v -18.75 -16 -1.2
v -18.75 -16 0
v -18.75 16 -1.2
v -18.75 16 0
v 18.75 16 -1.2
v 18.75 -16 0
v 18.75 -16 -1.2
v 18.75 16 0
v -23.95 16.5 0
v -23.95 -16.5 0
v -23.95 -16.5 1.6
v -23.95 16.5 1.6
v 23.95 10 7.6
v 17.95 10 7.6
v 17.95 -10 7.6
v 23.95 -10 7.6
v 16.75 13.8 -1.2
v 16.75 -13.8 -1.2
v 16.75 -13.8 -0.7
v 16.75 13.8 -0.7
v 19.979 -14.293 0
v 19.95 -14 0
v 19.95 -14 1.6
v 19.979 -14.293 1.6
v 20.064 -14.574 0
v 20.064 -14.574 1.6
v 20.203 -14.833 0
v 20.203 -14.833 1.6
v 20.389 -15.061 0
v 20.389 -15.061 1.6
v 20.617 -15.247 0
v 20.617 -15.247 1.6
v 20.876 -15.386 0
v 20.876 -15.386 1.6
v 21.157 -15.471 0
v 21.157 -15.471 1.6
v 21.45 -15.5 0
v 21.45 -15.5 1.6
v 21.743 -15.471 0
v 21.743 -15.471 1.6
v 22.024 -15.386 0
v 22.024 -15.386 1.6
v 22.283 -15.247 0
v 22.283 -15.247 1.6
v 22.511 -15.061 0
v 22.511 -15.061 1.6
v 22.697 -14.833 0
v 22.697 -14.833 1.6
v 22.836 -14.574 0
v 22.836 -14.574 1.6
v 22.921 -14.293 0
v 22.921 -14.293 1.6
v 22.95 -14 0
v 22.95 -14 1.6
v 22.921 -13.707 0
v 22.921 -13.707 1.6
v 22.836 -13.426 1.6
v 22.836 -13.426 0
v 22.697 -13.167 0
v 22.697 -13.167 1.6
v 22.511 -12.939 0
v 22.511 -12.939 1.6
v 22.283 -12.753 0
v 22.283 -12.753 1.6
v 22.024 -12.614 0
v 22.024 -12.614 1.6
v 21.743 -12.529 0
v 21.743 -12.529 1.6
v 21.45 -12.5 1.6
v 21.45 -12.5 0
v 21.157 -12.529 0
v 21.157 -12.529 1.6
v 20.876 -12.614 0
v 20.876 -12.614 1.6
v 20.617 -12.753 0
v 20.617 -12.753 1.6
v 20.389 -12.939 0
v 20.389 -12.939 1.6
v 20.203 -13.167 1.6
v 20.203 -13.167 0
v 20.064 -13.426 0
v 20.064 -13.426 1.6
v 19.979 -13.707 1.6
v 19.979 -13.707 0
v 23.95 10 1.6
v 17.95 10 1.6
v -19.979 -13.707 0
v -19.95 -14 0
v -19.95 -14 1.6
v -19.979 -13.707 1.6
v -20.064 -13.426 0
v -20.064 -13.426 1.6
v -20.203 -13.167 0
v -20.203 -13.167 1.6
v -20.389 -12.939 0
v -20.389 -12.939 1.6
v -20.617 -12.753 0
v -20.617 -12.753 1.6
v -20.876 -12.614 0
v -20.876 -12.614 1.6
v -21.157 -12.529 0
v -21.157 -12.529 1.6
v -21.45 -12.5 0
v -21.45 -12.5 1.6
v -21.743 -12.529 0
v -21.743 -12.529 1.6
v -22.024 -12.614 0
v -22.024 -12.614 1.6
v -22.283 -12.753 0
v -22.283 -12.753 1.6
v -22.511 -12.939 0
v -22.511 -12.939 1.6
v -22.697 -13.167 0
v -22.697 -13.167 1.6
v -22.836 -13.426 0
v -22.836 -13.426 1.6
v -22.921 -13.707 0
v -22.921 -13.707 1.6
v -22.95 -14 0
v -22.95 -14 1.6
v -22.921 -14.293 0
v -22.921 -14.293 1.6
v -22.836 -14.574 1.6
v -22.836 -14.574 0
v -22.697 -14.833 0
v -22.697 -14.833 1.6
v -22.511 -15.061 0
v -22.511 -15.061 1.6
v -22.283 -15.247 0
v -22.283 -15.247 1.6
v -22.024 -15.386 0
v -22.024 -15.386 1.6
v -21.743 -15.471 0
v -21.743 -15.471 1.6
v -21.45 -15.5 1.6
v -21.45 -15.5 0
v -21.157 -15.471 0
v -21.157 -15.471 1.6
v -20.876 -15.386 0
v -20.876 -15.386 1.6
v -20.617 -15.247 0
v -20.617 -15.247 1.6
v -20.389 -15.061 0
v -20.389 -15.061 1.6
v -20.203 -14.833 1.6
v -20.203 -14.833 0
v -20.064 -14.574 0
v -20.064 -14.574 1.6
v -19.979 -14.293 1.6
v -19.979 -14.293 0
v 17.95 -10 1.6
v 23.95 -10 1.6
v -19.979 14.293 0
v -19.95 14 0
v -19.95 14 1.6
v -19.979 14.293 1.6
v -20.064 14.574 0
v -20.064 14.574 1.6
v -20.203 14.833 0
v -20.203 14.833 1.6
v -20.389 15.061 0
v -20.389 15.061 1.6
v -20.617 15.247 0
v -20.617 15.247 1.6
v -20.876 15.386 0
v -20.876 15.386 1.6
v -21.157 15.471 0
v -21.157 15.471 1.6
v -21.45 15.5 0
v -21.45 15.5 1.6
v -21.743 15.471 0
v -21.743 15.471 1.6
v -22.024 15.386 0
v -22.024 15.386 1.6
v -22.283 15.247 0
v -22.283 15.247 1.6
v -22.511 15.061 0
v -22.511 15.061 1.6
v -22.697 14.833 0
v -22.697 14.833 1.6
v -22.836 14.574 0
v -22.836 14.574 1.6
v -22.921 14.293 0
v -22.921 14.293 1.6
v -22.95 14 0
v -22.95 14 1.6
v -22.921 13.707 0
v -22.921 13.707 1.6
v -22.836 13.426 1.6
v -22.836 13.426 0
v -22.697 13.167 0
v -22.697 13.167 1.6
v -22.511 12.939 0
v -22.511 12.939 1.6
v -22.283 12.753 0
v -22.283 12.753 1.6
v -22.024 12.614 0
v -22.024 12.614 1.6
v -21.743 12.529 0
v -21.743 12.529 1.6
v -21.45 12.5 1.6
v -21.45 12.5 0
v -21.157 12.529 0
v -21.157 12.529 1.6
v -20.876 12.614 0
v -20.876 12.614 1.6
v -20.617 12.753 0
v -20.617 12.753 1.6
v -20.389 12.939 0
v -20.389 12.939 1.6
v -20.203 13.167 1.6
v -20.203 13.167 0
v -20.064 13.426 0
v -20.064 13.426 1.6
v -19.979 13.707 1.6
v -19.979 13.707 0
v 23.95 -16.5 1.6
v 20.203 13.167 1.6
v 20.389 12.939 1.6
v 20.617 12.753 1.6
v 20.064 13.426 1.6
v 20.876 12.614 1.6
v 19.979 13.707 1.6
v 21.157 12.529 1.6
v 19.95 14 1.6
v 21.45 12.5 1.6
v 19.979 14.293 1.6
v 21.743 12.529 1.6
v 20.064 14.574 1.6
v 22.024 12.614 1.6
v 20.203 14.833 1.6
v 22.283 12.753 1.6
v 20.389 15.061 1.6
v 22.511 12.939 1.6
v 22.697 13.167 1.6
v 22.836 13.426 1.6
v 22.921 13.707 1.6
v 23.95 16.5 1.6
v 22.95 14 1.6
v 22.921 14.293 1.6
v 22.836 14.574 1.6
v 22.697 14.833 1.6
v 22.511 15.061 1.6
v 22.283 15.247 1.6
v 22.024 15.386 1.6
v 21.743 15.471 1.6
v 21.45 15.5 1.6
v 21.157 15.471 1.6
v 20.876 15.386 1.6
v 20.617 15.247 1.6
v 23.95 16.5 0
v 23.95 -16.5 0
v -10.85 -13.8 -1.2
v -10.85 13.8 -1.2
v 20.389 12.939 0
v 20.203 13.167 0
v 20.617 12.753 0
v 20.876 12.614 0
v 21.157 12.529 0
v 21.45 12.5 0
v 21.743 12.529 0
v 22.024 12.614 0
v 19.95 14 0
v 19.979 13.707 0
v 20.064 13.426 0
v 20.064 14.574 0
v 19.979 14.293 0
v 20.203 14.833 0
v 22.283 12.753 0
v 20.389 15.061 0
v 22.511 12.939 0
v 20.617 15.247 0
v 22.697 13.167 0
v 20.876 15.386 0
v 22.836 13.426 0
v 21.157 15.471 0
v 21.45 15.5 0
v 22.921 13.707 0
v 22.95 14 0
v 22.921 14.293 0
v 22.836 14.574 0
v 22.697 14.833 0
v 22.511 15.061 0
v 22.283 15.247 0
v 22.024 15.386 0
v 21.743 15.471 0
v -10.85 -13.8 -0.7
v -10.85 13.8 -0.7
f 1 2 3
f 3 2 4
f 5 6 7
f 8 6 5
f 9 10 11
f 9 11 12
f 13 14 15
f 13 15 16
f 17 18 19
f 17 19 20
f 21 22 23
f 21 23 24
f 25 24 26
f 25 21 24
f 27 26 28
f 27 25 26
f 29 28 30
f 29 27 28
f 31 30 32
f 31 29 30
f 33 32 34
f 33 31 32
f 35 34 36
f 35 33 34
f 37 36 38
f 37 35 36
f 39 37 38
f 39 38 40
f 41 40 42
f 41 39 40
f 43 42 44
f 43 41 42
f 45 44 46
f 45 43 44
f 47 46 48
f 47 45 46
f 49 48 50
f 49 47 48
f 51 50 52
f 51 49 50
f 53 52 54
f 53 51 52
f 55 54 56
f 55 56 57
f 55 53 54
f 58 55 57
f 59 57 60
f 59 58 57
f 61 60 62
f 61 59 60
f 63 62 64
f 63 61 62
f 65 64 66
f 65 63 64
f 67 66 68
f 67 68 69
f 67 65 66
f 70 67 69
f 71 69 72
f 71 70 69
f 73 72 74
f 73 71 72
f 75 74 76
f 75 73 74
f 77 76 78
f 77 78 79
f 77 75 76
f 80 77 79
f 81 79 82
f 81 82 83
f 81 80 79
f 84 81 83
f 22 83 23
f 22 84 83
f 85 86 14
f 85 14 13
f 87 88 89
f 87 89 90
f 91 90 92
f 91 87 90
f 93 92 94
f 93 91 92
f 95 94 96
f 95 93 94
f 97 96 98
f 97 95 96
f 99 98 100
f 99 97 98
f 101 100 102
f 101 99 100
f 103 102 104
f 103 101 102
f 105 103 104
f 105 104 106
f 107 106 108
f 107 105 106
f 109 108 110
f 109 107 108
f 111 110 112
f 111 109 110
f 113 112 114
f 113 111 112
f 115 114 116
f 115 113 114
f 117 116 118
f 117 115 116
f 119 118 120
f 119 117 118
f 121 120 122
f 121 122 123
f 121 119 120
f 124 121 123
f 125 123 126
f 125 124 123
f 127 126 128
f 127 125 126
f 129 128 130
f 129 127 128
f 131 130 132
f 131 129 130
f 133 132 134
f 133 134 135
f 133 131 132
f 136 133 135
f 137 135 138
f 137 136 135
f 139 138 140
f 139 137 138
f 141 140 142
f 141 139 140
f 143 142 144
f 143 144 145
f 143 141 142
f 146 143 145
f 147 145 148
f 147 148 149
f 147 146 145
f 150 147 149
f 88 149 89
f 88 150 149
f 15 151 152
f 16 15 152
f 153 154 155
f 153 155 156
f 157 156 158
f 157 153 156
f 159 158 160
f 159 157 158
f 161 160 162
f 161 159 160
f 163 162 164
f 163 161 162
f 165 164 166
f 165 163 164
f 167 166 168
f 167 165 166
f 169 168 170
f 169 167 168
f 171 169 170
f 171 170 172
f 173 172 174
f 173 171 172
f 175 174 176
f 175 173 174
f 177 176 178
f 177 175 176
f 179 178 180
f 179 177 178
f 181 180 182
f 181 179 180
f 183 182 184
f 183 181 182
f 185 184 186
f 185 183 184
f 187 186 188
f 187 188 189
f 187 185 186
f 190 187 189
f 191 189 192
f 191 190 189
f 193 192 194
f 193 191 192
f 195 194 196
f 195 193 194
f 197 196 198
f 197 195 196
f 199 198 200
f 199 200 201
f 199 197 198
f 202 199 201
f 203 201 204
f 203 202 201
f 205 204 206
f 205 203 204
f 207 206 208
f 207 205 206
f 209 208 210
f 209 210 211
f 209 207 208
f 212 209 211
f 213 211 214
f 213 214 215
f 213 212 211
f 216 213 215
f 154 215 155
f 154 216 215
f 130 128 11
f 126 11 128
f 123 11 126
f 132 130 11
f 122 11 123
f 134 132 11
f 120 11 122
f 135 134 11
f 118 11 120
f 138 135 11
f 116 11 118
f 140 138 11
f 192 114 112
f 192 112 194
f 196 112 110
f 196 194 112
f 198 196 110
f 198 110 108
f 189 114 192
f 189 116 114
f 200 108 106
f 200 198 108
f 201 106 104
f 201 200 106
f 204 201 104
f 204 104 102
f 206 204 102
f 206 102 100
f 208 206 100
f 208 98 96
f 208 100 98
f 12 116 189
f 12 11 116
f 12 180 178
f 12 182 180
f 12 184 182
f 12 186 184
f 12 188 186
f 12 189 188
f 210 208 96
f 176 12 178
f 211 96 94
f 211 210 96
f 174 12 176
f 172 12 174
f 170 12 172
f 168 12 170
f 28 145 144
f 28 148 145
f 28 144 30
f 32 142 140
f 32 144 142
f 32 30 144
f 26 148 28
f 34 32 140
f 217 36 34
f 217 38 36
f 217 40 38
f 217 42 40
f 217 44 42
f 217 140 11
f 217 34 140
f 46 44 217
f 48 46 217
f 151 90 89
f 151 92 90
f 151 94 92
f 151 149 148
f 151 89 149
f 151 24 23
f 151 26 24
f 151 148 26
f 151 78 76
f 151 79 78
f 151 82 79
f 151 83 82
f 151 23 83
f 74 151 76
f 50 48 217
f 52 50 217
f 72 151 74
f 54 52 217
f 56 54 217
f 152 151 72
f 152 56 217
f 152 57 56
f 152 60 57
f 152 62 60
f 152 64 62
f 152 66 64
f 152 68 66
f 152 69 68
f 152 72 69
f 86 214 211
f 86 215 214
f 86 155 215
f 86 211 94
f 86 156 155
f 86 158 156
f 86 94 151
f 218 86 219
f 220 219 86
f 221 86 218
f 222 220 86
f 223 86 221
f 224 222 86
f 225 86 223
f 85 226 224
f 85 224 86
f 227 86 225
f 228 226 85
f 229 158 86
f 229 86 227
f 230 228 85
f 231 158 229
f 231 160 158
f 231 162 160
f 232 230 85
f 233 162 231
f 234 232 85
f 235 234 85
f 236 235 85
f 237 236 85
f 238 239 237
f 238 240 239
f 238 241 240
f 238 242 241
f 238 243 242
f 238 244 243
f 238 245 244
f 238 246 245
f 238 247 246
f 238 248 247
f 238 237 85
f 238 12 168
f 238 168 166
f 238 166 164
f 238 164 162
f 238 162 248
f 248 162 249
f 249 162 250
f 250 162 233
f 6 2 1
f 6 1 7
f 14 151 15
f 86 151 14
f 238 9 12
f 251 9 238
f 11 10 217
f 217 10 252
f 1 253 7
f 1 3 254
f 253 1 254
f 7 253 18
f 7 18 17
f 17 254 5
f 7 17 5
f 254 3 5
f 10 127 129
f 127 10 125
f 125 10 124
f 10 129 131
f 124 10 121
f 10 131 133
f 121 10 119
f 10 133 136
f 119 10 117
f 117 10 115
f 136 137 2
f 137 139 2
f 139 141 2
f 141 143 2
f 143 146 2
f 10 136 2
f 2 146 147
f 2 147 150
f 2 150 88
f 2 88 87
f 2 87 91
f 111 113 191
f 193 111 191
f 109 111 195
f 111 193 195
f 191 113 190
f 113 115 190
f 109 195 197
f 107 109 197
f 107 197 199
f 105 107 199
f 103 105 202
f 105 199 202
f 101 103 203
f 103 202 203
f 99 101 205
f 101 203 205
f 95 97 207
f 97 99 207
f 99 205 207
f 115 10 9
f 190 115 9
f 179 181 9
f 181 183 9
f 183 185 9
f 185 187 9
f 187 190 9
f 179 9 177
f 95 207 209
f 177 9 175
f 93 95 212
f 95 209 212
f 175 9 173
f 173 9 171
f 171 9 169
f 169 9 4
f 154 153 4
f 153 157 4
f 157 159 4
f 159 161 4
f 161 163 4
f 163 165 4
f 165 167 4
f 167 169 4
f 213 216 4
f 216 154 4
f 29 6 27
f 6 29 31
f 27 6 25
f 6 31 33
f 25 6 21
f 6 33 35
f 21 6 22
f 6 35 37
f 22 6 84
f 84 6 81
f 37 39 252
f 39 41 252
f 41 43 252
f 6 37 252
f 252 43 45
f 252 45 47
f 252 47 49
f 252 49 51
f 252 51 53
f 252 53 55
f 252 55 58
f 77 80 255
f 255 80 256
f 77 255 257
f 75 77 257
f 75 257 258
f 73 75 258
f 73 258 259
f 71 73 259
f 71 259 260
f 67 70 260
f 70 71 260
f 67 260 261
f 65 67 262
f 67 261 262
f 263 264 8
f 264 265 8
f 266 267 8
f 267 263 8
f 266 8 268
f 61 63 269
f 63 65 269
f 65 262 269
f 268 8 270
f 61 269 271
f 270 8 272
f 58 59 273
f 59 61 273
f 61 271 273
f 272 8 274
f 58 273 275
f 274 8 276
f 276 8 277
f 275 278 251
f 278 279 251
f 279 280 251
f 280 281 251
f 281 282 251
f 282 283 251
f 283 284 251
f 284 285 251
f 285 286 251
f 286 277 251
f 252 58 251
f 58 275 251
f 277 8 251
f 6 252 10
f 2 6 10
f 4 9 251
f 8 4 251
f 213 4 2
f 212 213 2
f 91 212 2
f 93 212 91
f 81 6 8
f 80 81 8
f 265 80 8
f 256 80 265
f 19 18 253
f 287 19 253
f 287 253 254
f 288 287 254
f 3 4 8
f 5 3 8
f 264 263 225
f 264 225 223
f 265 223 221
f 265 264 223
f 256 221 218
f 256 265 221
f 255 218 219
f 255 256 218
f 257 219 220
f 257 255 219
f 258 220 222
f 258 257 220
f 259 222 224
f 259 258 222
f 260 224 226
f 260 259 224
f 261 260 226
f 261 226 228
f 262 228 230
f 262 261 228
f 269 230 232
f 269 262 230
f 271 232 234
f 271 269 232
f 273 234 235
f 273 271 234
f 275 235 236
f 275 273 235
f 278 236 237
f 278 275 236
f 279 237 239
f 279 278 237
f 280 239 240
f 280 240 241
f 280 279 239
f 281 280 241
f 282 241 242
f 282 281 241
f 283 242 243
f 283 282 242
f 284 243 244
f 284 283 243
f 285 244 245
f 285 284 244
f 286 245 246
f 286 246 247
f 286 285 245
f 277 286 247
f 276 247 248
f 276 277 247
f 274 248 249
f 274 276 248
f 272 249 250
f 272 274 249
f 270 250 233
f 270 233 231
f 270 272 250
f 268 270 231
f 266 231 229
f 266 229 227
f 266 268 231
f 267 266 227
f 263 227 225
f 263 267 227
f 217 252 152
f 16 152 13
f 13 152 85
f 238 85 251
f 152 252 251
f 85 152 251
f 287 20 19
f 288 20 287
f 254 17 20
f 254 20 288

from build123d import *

# Parameters (mm, degrees)
BASE_PCB_2_W              = 47.9
BASE_PCB_2_H              = 33
BASE_PCB_2_R              = 1.5
BASE_PCB_DEPTH            = 1.6
ESQUISSE4_W               = 37.5
ESQUISSE4_H               = 32
E_INK_DISPLAY_DEPTH       = 1.2
ESQUISSE5_W               = 27.6
ESQUISSE5_H               = 27.6
DISPLAY_200_200_DEPTH     = 0.5
ESQUISSE6_W               = 6
ESQUISSE6_H               = 20
CONNECTEUR_8BROCHES_DEPTH = 6


with BuildPart() as part:
    # BASE PCB 2 → Base_PCB (new body)
    with BuildSketch(Plane.XY):
        Rectangle(BASE_PCB_2_W, BASE_PCB_2_H)
        with Locations((-21.45, 14)):
            Circle(BASE_PCB_2_R, mode=Mode.SUBTRACT)
        with Locations((-21.45, -14)):
            Circle(BASE_PCB_2_R, mode=Mode.SUBTRACT)
        with Locations(Location((21.45, -14, 0), (0, 0, 180))):
            Circle(BASE_PCB_2_R, mode=Mode.SUBTRACT)
        with Locations(Location((21.45, 14, 0), (0, 0, 180))):
            Circle(BASE_PCB_2_R, mode=Mode.SUBTRACT)
    extrude(amount=BASE_PCB_DEPTH)

    # Esquisse4 → E-Ink_display (add)
    with BuildSketch(Plane.XY):
        Rectangle(ESQUISSE4_W, ESQUISSE4_H)
    extrude(amount=-E_INK_DISPLAY_DEPTH)

    # Esquisse5 → Display_200*200 (cut)
    with BuildSketch(Plane(origin=(0, 0, -1.2), x_dir=(-1, 0, 0), z_dir=(0, 0, -1))):
        with Locations((-2.95, 0)):
            Rectangle(ESQUISSE5_W, ESQUISSE5_H)
    extrude(amount=-DISPLAY_200_200_DEPTH, mode=Mode.SUBTRACT)

    # Esquisse6 → Connecteur_8broches (add)
    with BuildSketch(Plane.XY.offset(1.6)):
        with Locations((20.95, 0)):
            Rectangle(ESQUISSE6_W, ESQUISSE6_H)
    extrude(amount=CONNECTEUR_8BROCHES_DEPTH)


solid = part.part
